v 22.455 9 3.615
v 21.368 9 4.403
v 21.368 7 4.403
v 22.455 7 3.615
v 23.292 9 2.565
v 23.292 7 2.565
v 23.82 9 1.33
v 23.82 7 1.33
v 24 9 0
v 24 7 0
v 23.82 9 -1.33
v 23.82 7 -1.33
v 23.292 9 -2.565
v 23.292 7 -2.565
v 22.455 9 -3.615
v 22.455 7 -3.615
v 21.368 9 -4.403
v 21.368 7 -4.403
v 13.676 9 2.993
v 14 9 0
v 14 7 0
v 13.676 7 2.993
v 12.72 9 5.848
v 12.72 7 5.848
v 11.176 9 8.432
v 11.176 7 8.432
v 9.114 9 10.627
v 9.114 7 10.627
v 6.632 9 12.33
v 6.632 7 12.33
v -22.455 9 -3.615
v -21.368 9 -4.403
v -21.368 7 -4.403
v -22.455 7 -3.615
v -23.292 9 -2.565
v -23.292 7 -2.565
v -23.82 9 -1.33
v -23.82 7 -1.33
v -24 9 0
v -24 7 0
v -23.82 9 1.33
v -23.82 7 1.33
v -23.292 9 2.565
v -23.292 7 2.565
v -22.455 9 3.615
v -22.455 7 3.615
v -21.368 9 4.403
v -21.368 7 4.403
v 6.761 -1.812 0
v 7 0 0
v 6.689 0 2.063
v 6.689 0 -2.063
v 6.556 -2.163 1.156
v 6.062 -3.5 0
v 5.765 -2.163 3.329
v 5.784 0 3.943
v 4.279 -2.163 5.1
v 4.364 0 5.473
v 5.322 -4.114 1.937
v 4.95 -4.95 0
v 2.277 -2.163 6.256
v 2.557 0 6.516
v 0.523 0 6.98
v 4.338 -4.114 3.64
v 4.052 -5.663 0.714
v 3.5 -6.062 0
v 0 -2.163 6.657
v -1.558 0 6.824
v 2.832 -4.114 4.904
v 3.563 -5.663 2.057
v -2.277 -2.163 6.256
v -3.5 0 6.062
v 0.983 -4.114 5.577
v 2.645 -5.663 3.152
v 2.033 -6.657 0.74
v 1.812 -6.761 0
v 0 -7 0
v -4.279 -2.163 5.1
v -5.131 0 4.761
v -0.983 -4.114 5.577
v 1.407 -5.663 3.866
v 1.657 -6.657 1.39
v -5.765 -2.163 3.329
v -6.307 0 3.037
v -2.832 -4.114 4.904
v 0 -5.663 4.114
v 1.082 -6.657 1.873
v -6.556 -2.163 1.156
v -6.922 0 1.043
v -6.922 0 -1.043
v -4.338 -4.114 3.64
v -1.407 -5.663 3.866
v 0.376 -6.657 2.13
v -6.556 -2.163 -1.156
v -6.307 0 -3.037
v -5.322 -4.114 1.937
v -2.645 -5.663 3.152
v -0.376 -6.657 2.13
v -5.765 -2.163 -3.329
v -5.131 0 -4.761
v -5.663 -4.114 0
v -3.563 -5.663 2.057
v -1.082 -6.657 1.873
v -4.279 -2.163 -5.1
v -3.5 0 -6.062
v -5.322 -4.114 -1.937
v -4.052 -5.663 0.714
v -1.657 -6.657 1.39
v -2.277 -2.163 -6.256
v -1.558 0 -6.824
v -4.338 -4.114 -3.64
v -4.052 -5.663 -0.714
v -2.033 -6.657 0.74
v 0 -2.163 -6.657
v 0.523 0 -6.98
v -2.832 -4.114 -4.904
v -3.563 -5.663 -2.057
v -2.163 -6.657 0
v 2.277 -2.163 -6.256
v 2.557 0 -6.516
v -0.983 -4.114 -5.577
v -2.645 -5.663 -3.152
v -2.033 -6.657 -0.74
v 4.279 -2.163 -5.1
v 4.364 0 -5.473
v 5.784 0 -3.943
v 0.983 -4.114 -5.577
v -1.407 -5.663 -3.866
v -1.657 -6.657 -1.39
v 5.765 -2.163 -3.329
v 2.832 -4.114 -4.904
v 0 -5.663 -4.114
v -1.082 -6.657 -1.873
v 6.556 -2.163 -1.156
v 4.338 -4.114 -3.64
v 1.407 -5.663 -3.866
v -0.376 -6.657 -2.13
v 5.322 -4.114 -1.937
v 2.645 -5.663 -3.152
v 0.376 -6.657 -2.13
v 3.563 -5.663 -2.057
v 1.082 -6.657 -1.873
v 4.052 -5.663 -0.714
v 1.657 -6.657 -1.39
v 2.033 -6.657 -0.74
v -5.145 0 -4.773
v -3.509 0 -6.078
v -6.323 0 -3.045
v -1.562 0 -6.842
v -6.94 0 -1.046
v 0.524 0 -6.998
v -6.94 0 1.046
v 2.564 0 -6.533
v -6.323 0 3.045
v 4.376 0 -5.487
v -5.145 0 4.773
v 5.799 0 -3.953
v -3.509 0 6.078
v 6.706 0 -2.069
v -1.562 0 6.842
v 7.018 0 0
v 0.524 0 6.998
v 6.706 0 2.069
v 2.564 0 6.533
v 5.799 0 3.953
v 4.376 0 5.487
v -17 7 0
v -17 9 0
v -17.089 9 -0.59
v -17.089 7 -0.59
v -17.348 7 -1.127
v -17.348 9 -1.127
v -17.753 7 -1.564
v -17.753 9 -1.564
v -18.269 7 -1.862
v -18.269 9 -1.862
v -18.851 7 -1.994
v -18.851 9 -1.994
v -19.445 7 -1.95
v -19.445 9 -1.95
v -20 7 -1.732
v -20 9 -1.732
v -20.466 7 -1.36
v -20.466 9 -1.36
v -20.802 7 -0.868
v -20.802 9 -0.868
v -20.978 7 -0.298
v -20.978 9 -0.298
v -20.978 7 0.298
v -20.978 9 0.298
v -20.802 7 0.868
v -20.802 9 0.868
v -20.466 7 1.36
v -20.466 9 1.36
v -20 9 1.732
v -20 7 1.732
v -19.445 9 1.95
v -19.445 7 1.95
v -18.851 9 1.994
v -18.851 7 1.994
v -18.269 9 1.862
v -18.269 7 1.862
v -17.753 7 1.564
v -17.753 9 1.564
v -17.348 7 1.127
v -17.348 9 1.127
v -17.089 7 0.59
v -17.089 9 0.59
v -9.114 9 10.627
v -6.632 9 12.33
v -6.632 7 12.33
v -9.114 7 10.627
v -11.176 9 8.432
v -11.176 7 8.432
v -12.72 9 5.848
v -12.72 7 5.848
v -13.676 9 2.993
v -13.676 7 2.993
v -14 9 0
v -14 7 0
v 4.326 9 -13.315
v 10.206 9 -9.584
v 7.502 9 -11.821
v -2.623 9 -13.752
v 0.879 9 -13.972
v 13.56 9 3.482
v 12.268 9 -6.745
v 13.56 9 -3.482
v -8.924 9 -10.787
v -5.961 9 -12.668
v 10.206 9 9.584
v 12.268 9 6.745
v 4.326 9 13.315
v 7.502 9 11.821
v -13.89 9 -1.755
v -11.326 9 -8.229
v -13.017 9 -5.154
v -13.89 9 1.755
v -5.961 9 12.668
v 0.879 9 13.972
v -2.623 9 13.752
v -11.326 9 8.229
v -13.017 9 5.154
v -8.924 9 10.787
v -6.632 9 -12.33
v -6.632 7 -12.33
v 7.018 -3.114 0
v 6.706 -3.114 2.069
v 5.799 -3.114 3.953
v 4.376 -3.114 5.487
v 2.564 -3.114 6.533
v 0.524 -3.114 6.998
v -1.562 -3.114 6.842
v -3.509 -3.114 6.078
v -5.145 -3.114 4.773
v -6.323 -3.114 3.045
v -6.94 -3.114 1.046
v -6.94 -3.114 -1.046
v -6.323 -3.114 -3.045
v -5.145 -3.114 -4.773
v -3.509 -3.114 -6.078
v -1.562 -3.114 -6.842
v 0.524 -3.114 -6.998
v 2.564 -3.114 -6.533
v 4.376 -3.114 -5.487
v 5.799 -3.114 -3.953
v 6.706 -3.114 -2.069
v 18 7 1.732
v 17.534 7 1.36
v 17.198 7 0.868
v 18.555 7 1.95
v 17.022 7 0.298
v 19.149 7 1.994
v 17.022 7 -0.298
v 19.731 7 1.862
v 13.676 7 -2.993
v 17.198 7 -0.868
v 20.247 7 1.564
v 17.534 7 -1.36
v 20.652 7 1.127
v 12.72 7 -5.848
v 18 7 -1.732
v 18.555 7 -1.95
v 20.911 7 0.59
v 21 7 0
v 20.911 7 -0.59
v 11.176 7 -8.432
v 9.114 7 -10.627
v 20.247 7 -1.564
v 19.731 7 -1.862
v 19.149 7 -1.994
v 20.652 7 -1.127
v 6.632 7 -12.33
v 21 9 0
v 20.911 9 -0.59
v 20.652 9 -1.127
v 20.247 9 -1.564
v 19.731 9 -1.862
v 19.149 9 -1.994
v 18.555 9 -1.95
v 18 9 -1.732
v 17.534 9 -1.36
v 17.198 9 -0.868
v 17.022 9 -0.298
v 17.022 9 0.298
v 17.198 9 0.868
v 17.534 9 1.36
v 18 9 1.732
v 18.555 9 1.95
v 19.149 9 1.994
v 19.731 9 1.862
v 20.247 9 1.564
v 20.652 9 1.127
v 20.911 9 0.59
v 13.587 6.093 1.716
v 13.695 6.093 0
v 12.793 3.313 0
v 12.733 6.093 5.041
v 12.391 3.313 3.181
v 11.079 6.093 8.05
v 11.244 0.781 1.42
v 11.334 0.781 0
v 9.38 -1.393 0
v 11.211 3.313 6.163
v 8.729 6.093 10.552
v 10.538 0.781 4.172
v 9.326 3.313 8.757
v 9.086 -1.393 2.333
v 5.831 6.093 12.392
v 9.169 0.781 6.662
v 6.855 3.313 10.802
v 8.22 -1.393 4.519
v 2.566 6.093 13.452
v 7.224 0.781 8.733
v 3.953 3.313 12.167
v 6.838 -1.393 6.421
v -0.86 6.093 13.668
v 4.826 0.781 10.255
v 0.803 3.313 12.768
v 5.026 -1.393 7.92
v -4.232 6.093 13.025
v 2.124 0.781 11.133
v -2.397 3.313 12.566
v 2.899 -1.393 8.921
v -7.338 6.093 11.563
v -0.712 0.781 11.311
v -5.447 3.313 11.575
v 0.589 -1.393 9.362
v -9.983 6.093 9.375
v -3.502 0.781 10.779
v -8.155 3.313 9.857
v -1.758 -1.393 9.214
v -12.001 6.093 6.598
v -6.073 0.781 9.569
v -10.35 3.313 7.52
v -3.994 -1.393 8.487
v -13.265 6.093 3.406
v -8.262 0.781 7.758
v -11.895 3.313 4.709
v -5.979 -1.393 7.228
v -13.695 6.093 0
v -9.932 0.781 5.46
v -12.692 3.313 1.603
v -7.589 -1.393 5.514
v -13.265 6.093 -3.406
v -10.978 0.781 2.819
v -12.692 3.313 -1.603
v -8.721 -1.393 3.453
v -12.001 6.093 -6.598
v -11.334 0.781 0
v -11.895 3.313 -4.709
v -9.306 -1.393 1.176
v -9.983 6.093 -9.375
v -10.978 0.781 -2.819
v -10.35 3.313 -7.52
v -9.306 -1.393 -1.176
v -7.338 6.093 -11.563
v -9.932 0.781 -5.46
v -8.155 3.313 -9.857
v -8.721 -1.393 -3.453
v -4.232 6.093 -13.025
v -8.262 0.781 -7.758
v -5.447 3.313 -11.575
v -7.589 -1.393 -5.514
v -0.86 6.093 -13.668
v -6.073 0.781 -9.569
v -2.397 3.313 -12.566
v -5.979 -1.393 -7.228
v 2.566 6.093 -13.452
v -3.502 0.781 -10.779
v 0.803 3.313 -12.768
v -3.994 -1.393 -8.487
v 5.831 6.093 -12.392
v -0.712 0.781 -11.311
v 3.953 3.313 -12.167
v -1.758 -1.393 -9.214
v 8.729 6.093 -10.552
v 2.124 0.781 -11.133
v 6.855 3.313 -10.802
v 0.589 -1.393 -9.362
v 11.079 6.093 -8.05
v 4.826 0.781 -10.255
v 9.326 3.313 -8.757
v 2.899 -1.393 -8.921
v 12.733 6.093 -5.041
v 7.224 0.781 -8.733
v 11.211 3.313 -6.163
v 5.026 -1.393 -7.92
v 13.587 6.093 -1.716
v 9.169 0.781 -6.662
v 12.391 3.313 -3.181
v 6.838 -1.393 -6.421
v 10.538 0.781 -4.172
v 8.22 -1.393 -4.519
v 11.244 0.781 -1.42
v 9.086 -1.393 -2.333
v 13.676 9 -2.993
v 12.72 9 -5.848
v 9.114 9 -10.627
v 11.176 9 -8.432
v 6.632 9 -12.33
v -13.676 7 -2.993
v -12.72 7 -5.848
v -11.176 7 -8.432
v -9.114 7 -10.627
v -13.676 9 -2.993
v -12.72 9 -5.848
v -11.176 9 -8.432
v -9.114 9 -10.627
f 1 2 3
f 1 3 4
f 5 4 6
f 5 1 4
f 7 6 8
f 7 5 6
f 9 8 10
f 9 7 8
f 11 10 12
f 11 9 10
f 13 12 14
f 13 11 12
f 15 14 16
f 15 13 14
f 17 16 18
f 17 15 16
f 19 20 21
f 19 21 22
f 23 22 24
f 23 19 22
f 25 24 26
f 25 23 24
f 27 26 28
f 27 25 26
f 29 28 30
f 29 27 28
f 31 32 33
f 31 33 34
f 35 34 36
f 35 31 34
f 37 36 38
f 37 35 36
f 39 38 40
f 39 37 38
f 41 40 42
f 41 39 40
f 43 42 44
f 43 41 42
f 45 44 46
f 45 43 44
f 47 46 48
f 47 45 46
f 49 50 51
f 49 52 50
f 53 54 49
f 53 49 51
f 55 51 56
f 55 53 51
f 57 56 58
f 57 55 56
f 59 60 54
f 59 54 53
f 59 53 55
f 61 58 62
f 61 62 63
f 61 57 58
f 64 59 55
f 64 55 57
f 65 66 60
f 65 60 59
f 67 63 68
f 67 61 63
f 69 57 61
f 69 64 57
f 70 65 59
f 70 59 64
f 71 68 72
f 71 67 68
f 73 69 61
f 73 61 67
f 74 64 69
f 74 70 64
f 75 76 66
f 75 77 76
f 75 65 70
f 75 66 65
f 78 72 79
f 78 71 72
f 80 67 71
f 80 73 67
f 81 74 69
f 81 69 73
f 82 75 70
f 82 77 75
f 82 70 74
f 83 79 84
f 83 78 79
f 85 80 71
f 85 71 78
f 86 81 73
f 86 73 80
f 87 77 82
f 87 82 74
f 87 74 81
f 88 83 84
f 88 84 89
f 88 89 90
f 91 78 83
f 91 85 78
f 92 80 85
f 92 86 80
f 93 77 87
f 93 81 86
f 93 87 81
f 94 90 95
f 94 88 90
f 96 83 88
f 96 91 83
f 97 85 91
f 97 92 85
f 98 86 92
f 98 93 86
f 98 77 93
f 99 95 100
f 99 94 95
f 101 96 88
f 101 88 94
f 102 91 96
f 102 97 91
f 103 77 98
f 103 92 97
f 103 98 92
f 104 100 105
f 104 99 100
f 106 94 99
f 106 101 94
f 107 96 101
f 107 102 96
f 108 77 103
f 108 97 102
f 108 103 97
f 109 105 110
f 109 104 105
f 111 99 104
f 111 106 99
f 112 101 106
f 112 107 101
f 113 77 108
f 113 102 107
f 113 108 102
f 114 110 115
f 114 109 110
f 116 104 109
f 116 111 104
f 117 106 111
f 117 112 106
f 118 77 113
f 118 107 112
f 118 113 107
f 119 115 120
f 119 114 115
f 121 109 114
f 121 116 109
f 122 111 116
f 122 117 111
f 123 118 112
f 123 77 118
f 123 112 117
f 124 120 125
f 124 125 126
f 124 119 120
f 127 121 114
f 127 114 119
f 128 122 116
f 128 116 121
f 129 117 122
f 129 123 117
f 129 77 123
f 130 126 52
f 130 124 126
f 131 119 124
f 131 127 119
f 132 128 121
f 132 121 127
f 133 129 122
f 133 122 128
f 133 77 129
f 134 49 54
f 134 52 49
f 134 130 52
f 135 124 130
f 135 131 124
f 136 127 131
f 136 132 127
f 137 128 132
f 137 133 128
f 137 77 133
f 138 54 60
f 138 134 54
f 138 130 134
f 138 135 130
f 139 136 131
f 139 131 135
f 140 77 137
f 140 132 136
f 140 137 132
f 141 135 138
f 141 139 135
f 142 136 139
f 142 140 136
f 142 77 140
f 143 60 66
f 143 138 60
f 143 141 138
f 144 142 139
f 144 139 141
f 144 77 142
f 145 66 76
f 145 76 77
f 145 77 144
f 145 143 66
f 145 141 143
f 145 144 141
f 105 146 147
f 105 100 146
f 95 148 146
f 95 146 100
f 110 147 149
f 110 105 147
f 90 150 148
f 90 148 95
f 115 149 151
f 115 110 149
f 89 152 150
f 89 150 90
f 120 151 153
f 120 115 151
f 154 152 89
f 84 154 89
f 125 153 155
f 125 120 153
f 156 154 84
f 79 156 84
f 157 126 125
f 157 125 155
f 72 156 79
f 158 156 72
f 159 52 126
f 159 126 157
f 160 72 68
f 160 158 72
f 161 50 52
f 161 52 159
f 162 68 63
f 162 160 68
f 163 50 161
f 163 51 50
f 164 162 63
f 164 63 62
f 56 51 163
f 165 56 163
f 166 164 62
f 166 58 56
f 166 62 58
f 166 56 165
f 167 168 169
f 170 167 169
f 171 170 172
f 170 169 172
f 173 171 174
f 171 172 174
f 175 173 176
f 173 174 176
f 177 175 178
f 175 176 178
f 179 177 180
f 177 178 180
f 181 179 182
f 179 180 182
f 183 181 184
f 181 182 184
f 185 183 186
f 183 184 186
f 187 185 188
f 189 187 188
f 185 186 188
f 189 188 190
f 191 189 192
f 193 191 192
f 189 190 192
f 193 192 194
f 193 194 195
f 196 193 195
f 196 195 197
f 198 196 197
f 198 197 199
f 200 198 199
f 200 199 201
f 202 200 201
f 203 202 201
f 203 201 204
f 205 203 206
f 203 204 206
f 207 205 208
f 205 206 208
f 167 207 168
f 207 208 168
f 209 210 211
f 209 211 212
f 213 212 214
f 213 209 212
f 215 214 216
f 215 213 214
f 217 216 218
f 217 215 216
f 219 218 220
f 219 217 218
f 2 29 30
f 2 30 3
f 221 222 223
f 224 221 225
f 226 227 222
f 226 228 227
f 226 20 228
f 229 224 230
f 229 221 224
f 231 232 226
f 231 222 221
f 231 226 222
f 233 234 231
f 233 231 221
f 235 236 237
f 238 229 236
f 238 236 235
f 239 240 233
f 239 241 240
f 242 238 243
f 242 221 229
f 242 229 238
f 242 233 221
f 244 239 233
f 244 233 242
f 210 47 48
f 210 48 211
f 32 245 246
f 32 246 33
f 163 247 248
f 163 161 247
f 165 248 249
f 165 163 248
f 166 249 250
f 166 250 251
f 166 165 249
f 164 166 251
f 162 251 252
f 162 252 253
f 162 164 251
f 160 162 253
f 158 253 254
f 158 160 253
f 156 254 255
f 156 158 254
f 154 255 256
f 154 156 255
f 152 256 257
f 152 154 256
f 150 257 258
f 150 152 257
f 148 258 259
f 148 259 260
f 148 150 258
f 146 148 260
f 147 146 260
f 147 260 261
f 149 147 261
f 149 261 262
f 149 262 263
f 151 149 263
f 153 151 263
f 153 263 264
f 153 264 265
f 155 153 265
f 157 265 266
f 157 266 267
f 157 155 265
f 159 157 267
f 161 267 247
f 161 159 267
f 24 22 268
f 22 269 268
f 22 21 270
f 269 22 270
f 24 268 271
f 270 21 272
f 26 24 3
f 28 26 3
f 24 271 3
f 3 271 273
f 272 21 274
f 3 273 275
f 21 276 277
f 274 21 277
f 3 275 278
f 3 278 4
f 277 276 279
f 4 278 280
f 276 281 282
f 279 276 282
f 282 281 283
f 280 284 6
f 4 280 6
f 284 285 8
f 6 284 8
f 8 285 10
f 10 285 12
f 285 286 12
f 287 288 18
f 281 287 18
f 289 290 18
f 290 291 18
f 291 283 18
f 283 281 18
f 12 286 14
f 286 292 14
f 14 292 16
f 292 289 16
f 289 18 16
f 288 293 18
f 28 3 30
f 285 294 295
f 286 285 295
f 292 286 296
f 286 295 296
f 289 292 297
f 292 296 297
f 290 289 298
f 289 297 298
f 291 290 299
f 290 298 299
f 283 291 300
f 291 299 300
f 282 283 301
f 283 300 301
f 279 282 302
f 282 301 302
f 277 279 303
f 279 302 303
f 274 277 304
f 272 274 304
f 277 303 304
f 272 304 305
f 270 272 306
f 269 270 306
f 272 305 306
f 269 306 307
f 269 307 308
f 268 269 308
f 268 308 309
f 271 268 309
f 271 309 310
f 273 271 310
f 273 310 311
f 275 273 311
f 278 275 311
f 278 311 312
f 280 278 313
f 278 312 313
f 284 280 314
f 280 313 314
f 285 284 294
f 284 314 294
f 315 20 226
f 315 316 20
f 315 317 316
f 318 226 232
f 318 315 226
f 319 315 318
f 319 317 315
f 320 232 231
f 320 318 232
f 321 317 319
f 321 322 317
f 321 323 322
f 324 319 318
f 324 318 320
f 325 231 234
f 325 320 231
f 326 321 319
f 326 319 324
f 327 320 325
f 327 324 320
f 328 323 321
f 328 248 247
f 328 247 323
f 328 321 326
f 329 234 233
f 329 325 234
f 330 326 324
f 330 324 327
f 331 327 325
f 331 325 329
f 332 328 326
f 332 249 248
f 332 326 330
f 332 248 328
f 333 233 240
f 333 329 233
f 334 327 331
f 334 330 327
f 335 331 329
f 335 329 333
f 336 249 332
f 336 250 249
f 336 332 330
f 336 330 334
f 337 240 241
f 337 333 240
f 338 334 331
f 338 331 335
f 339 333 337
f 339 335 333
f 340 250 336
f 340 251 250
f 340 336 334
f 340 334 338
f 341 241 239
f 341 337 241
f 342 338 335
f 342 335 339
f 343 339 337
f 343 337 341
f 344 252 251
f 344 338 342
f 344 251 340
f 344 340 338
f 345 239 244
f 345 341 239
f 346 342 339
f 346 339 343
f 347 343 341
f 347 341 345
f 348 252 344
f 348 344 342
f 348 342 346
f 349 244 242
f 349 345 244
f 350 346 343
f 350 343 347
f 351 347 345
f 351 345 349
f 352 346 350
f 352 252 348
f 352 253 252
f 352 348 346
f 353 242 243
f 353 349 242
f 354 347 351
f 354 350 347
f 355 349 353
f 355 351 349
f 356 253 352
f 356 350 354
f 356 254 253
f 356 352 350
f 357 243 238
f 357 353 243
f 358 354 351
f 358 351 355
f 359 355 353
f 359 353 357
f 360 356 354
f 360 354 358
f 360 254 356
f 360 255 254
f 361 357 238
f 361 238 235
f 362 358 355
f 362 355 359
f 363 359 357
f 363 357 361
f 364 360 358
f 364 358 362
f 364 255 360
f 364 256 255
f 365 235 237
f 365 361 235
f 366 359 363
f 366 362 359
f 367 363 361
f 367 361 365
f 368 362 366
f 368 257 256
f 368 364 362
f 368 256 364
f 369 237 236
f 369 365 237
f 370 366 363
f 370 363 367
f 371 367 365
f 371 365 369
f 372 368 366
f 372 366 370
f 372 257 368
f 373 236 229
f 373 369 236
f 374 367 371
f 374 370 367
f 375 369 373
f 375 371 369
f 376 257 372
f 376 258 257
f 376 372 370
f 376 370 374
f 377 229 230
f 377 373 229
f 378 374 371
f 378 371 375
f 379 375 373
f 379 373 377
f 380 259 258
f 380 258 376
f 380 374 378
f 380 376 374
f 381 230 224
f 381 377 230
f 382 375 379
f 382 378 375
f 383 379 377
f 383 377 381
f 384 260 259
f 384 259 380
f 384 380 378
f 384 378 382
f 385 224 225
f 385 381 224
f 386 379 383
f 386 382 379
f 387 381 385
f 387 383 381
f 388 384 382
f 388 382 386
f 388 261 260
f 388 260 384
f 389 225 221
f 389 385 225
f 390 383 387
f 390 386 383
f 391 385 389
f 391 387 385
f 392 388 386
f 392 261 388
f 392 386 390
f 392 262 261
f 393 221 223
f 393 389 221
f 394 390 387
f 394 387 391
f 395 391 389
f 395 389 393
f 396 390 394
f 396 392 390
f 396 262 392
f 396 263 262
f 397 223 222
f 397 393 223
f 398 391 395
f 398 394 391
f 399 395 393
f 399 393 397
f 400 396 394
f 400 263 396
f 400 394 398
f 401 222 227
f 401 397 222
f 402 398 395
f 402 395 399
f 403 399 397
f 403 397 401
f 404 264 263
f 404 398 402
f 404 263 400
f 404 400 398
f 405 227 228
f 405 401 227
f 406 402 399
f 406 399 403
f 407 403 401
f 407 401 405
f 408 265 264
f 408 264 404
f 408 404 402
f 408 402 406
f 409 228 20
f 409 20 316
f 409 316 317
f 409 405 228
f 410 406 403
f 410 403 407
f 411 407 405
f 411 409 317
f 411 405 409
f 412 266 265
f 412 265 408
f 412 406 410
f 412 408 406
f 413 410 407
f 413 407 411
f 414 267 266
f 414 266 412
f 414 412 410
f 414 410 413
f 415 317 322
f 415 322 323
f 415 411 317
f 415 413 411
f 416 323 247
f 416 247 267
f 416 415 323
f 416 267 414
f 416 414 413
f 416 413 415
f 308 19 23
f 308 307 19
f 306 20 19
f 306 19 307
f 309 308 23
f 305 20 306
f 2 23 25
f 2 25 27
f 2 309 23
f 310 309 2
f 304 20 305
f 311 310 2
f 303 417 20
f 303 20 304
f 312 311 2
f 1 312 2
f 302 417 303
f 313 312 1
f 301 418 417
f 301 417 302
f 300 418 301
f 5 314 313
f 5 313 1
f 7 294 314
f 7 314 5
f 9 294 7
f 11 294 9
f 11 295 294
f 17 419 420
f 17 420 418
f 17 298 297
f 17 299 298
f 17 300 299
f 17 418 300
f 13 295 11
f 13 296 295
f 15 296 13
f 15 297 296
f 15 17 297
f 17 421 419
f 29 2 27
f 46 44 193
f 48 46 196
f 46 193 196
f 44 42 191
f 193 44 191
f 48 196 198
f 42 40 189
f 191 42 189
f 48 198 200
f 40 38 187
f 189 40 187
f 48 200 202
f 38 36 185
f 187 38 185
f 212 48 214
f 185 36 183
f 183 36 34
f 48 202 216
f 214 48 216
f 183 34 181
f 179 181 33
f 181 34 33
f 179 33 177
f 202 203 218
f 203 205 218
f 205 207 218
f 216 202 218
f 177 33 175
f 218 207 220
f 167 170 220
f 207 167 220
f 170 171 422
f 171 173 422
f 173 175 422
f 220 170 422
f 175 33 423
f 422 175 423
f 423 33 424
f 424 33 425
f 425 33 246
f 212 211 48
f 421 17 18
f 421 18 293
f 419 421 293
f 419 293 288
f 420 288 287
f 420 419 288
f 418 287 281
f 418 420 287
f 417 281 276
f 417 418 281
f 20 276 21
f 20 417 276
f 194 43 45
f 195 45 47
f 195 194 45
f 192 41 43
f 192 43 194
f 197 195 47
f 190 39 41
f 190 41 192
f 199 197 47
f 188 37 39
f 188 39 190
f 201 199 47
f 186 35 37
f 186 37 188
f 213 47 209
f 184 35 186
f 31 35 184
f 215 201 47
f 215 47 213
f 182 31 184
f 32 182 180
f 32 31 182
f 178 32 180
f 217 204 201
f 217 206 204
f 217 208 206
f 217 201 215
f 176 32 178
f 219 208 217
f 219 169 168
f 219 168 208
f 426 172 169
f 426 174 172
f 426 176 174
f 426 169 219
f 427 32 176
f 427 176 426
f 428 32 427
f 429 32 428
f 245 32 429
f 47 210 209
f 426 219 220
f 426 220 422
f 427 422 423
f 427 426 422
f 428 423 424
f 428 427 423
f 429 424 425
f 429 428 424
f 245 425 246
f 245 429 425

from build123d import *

# Parameters (mm, degrees)
SKETCH2_R           = 5
SKETCH2_R_2         = 2
BOSS_EXTRUDE1_DEPTH = 2


with BuildPart() as part:
    # Sketch1 → Revolve1 (revolve)
    with BuildSketch(Plane.XY):
        with BuildLine():
            Line((0, 9), (14, 9))
            ThreePointArc((14, 9), (12.129558808, 2.009019874), (7.018028125, -3.113929224))
            Line((7.018028125, -3.113929224), (7.018028125, 0))
            Line((7.018028125, 0), (7, 0))
            ThreePointArc((7, 0), (4.949747468, -4.949747468), (0, -7))
            Line((0, -7), (0, 9))
        make_face()
    revolve(axis=Axis((0, 9, 0), (0, -1, 0)))


with BuildPart() as body_2:
    # Sketch2 → Boss-Extrude1 (new body)
    with BuildSketch(Plane(origin=(0, 9, 0), x_dir=(1, 0, 0), z_dir=(0, 1, 0))):
        with BuildLine():
            Line((21.368421053, 4.403473824), (6.631578947, 12.329726707))
            ThreePointArc((6.631578947, 12.329726707), (12.017531054, 7.181848465), (14, 0))
            ThreePointArc((14, 0), (16.43505412, 4.291975376), (21.368421053, 4.403473824))
        make_face()
        with BuildLine():
            ThreePointArc((21.368421053, -4.403473824), (16.43505412, -4.291975376), (14, 0))
            ThreePointArc((14, 0), (12.017531054, -7.181848465), (6.631578947, -12.329726707))
            Line((6.631578947, -12.329726707), (21.368421053, -4.403473824))
        make_face()
        with Locations((19, 0)):
            Circle(SKETCH2_R)
        with Locations((19, 0)):
            Circle(SKETCH2_R_2, mode=Mode.SUBTRACT)
        with BuildLine():
            ThreePointArc((-6.631578947, -12.329726707), (-12.017531054, -7.181848465), (-14, 0))
            ThreePointArc((-14, 0), (-16.43505412, -4.291975376), (-21.368421053, -4.403473824))
            Line((-21.368421053, -4.403473824), (-6.631578947, -12.329726707))
        make_face()
        with BuildLine():
            Line((-6.631578947, 12.329726707), (-21.368421053, 4.403473824))
            ThreePointArc((-21.368421053, 4.403473824), (-16.43505412, 4.291975376), (-14, 0))
            ThreePointArc((-14, 0), (-12.017531054, 7.181848465), (-6.631578947, 12.329726707))
        make_face()
        with Locations((-19, 0)):
            Circle(SKETCH2_R)
        with Locations((-19, 0)):
            Circle(SKETCH2_R_2, mode=Mode.SUBTRACT)
    extrude(amount=-BOSS_EXTRUDE1_DEPTH)


solid = Compound([part.part, body_2.part])
